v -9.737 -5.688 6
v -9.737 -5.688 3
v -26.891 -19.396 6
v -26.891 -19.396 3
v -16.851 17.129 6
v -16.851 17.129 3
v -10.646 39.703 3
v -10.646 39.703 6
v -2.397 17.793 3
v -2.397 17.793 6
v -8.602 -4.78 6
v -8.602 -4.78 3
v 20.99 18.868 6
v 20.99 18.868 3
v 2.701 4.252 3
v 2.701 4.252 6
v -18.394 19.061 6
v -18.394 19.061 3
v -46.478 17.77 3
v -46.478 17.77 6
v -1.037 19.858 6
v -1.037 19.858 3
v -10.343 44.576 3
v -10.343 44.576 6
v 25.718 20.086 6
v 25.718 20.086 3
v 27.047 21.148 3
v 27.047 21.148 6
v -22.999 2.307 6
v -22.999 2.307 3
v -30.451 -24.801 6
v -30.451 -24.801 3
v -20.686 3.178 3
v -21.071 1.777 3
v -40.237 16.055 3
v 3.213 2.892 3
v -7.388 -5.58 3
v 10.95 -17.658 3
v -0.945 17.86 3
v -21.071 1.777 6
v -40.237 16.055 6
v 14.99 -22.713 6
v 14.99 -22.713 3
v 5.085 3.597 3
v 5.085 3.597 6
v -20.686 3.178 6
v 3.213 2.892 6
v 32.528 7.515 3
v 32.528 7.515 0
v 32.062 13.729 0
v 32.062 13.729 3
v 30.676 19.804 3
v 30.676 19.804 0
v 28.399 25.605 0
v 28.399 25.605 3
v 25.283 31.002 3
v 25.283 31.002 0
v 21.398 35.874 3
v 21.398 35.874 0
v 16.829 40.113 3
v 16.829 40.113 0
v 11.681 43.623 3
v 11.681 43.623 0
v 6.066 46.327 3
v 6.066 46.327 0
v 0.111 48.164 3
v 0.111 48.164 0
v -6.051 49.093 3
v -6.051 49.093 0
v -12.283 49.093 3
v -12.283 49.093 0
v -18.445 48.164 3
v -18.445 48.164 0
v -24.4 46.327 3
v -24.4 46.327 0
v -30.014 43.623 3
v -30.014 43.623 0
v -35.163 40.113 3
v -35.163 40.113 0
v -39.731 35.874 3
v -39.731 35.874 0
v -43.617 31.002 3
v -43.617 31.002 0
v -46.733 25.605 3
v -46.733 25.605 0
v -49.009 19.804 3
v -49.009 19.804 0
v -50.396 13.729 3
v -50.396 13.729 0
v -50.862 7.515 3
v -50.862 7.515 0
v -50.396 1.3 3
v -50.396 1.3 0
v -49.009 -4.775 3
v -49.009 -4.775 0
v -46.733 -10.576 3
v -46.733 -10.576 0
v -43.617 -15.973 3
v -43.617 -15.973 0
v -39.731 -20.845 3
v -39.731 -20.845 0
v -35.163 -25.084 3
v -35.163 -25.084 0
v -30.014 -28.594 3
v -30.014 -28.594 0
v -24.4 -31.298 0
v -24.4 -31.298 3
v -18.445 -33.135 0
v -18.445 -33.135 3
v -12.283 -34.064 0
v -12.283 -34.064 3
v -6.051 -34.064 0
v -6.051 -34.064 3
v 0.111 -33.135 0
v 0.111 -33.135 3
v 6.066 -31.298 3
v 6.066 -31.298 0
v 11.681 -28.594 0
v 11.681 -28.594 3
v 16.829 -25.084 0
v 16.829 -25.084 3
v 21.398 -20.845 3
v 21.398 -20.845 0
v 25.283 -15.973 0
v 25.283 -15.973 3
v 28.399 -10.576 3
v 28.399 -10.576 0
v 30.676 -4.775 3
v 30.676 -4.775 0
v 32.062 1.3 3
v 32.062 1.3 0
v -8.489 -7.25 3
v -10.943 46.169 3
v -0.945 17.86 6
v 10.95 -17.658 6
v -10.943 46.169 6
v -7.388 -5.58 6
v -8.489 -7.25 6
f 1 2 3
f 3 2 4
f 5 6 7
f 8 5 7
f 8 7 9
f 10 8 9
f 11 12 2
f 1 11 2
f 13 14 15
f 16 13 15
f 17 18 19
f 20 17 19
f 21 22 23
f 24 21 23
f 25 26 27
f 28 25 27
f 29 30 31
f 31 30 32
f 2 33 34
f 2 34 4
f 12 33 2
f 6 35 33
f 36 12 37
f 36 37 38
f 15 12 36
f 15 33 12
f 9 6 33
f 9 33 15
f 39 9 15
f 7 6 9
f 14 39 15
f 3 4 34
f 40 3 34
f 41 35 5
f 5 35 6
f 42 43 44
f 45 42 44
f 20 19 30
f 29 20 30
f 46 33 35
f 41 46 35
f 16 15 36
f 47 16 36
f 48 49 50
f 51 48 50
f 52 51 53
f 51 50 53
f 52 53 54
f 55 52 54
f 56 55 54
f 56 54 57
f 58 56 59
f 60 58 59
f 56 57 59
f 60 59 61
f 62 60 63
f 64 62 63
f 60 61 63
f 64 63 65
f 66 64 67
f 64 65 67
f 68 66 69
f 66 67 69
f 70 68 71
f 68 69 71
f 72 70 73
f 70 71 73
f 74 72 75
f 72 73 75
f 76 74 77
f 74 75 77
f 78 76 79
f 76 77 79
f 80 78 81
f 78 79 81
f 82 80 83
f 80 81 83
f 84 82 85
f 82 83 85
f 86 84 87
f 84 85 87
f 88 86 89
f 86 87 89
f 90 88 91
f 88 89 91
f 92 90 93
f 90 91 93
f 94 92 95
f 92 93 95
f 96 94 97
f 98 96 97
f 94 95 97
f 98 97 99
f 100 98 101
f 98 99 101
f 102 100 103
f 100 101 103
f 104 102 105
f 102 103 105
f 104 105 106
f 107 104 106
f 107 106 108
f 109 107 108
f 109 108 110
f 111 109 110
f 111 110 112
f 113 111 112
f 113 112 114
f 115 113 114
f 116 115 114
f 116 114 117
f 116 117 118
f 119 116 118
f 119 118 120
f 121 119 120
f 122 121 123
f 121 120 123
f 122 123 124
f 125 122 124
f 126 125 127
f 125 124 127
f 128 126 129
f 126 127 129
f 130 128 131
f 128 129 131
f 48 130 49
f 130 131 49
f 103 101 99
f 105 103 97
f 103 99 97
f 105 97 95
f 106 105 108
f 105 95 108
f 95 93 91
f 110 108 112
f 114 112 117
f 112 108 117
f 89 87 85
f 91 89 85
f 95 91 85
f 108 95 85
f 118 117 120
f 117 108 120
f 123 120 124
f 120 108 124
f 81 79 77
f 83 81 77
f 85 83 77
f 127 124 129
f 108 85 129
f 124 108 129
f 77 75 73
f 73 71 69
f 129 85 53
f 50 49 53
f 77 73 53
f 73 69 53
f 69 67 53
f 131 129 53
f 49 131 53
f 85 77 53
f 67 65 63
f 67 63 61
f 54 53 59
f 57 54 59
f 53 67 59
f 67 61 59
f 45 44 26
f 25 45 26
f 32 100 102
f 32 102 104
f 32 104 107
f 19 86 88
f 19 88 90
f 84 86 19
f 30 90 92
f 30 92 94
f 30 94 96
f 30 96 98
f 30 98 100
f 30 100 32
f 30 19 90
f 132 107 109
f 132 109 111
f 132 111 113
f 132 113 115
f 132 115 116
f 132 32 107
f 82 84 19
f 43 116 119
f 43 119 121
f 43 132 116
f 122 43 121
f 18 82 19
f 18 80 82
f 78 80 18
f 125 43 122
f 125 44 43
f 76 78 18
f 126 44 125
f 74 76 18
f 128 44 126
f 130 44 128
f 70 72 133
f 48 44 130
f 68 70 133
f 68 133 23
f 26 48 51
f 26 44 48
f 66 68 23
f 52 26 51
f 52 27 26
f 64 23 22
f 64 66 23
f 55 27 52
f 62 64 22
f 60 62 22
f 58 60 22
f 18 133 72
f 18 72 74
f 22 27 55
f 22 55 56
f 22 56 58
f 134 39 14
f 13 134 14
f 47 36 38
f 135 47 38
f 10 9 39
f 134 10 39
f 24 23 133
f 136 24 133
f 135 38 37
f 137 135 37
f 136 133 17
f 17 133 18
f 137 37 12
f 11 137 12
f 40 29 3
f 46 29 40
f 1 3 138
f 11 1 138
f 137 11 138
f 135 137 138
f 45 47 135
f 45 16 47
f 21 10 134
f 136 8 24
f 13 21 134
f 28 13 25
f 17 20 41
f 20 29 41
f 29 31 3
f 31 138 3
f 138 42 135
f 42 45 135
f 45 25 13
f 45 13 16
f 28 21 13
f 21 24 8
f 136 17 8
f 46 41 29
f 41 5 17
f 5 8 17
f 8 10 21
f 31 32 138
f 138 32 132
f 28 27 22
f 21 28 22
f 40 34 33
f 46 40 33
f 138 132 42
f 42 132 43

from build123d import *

# Parameters (mm, degrees)
F1_DEPTH = 6
F0_R     = 41.694861
F2_DEPTH = 3


with BuildPart() as f1:
    # F0 (on Top) → F1 (new body)
    with BuildSketch(Plane.XY):
        Polygon((-18.393972, 19.060652), (-46.477814, 17.770472), (-22.999159, 2.306981), (-30.450509, -24.801028), (-8.488552, -7.249981), (14.990103, -22.713471), (5.084683, 3.597162), (25.7176, 20.086097), (27.04664, 21.148209), (-1.037203, 19.858028), (-10.34319, 44.576459), (-10.942622, 46.168661), align=None)
        Polygon((10.949591, -17.657503), (-7.388475, -5.579703), (-8.602003, -4.78045), (-9.737139, -5.687601), (-26.890584, -19.395893), (-21.070687, 1.77689), (-20.685553, 3.178007), (-40.237148, 16.05506), (-16.850634, 17.129444), (-10.645603, 39.703344), (-2.396973, 17.79345), (-0.945419, 17.860135), (20.989542, 18.867834), (2.700961, 4.252391), (3.212937, 2.892488), align=None, mode=Mode.SUBTRACT)
    extrude(amount=F1_DEPTH)

    # F0 (on Top) → F2 (join)
    with BuildSketch(Plane.XY):
        with Locations((-9.16684, 7.514569)):
            Circle(F0_R)
        Polygon((-22.999159, 2.306981), (-46.477814, 17.770472), (-18.393972, 19.060652), (-10.942622, 46.168661), (-10.34319, 44.576459), (-1.037203, 19.858028), (27.04664, 21.148209), (25.7176, 20.086097), (5.084683, 3.597162), (14.990103, -22.713471), (-8.488552, -7.249981), (-30.450509, -24.801028), align=None, mode=Mode.SUBTRACT)
        Polygon((-8.602003, -4.78045), (-7.388475, -5.579703), (10.949591, -17.657503), (3.212937, 2.892488), (2.700961, 4.252391), (20.989542, 18.867834), (-0.945419, 17.860135), (-2.396973, 17.79345), (-10.645603, 39.703344), (-16.850634, 17.129444), (-40.237148, 16.05506), (-20.685553, 3.178007), (-21.070687, 1.77689), (-26.890584, -19.395893), (-9.737139, -5.687601), align=None)
    extrude(amount=F2_DEPTH)


solid = f1.part
